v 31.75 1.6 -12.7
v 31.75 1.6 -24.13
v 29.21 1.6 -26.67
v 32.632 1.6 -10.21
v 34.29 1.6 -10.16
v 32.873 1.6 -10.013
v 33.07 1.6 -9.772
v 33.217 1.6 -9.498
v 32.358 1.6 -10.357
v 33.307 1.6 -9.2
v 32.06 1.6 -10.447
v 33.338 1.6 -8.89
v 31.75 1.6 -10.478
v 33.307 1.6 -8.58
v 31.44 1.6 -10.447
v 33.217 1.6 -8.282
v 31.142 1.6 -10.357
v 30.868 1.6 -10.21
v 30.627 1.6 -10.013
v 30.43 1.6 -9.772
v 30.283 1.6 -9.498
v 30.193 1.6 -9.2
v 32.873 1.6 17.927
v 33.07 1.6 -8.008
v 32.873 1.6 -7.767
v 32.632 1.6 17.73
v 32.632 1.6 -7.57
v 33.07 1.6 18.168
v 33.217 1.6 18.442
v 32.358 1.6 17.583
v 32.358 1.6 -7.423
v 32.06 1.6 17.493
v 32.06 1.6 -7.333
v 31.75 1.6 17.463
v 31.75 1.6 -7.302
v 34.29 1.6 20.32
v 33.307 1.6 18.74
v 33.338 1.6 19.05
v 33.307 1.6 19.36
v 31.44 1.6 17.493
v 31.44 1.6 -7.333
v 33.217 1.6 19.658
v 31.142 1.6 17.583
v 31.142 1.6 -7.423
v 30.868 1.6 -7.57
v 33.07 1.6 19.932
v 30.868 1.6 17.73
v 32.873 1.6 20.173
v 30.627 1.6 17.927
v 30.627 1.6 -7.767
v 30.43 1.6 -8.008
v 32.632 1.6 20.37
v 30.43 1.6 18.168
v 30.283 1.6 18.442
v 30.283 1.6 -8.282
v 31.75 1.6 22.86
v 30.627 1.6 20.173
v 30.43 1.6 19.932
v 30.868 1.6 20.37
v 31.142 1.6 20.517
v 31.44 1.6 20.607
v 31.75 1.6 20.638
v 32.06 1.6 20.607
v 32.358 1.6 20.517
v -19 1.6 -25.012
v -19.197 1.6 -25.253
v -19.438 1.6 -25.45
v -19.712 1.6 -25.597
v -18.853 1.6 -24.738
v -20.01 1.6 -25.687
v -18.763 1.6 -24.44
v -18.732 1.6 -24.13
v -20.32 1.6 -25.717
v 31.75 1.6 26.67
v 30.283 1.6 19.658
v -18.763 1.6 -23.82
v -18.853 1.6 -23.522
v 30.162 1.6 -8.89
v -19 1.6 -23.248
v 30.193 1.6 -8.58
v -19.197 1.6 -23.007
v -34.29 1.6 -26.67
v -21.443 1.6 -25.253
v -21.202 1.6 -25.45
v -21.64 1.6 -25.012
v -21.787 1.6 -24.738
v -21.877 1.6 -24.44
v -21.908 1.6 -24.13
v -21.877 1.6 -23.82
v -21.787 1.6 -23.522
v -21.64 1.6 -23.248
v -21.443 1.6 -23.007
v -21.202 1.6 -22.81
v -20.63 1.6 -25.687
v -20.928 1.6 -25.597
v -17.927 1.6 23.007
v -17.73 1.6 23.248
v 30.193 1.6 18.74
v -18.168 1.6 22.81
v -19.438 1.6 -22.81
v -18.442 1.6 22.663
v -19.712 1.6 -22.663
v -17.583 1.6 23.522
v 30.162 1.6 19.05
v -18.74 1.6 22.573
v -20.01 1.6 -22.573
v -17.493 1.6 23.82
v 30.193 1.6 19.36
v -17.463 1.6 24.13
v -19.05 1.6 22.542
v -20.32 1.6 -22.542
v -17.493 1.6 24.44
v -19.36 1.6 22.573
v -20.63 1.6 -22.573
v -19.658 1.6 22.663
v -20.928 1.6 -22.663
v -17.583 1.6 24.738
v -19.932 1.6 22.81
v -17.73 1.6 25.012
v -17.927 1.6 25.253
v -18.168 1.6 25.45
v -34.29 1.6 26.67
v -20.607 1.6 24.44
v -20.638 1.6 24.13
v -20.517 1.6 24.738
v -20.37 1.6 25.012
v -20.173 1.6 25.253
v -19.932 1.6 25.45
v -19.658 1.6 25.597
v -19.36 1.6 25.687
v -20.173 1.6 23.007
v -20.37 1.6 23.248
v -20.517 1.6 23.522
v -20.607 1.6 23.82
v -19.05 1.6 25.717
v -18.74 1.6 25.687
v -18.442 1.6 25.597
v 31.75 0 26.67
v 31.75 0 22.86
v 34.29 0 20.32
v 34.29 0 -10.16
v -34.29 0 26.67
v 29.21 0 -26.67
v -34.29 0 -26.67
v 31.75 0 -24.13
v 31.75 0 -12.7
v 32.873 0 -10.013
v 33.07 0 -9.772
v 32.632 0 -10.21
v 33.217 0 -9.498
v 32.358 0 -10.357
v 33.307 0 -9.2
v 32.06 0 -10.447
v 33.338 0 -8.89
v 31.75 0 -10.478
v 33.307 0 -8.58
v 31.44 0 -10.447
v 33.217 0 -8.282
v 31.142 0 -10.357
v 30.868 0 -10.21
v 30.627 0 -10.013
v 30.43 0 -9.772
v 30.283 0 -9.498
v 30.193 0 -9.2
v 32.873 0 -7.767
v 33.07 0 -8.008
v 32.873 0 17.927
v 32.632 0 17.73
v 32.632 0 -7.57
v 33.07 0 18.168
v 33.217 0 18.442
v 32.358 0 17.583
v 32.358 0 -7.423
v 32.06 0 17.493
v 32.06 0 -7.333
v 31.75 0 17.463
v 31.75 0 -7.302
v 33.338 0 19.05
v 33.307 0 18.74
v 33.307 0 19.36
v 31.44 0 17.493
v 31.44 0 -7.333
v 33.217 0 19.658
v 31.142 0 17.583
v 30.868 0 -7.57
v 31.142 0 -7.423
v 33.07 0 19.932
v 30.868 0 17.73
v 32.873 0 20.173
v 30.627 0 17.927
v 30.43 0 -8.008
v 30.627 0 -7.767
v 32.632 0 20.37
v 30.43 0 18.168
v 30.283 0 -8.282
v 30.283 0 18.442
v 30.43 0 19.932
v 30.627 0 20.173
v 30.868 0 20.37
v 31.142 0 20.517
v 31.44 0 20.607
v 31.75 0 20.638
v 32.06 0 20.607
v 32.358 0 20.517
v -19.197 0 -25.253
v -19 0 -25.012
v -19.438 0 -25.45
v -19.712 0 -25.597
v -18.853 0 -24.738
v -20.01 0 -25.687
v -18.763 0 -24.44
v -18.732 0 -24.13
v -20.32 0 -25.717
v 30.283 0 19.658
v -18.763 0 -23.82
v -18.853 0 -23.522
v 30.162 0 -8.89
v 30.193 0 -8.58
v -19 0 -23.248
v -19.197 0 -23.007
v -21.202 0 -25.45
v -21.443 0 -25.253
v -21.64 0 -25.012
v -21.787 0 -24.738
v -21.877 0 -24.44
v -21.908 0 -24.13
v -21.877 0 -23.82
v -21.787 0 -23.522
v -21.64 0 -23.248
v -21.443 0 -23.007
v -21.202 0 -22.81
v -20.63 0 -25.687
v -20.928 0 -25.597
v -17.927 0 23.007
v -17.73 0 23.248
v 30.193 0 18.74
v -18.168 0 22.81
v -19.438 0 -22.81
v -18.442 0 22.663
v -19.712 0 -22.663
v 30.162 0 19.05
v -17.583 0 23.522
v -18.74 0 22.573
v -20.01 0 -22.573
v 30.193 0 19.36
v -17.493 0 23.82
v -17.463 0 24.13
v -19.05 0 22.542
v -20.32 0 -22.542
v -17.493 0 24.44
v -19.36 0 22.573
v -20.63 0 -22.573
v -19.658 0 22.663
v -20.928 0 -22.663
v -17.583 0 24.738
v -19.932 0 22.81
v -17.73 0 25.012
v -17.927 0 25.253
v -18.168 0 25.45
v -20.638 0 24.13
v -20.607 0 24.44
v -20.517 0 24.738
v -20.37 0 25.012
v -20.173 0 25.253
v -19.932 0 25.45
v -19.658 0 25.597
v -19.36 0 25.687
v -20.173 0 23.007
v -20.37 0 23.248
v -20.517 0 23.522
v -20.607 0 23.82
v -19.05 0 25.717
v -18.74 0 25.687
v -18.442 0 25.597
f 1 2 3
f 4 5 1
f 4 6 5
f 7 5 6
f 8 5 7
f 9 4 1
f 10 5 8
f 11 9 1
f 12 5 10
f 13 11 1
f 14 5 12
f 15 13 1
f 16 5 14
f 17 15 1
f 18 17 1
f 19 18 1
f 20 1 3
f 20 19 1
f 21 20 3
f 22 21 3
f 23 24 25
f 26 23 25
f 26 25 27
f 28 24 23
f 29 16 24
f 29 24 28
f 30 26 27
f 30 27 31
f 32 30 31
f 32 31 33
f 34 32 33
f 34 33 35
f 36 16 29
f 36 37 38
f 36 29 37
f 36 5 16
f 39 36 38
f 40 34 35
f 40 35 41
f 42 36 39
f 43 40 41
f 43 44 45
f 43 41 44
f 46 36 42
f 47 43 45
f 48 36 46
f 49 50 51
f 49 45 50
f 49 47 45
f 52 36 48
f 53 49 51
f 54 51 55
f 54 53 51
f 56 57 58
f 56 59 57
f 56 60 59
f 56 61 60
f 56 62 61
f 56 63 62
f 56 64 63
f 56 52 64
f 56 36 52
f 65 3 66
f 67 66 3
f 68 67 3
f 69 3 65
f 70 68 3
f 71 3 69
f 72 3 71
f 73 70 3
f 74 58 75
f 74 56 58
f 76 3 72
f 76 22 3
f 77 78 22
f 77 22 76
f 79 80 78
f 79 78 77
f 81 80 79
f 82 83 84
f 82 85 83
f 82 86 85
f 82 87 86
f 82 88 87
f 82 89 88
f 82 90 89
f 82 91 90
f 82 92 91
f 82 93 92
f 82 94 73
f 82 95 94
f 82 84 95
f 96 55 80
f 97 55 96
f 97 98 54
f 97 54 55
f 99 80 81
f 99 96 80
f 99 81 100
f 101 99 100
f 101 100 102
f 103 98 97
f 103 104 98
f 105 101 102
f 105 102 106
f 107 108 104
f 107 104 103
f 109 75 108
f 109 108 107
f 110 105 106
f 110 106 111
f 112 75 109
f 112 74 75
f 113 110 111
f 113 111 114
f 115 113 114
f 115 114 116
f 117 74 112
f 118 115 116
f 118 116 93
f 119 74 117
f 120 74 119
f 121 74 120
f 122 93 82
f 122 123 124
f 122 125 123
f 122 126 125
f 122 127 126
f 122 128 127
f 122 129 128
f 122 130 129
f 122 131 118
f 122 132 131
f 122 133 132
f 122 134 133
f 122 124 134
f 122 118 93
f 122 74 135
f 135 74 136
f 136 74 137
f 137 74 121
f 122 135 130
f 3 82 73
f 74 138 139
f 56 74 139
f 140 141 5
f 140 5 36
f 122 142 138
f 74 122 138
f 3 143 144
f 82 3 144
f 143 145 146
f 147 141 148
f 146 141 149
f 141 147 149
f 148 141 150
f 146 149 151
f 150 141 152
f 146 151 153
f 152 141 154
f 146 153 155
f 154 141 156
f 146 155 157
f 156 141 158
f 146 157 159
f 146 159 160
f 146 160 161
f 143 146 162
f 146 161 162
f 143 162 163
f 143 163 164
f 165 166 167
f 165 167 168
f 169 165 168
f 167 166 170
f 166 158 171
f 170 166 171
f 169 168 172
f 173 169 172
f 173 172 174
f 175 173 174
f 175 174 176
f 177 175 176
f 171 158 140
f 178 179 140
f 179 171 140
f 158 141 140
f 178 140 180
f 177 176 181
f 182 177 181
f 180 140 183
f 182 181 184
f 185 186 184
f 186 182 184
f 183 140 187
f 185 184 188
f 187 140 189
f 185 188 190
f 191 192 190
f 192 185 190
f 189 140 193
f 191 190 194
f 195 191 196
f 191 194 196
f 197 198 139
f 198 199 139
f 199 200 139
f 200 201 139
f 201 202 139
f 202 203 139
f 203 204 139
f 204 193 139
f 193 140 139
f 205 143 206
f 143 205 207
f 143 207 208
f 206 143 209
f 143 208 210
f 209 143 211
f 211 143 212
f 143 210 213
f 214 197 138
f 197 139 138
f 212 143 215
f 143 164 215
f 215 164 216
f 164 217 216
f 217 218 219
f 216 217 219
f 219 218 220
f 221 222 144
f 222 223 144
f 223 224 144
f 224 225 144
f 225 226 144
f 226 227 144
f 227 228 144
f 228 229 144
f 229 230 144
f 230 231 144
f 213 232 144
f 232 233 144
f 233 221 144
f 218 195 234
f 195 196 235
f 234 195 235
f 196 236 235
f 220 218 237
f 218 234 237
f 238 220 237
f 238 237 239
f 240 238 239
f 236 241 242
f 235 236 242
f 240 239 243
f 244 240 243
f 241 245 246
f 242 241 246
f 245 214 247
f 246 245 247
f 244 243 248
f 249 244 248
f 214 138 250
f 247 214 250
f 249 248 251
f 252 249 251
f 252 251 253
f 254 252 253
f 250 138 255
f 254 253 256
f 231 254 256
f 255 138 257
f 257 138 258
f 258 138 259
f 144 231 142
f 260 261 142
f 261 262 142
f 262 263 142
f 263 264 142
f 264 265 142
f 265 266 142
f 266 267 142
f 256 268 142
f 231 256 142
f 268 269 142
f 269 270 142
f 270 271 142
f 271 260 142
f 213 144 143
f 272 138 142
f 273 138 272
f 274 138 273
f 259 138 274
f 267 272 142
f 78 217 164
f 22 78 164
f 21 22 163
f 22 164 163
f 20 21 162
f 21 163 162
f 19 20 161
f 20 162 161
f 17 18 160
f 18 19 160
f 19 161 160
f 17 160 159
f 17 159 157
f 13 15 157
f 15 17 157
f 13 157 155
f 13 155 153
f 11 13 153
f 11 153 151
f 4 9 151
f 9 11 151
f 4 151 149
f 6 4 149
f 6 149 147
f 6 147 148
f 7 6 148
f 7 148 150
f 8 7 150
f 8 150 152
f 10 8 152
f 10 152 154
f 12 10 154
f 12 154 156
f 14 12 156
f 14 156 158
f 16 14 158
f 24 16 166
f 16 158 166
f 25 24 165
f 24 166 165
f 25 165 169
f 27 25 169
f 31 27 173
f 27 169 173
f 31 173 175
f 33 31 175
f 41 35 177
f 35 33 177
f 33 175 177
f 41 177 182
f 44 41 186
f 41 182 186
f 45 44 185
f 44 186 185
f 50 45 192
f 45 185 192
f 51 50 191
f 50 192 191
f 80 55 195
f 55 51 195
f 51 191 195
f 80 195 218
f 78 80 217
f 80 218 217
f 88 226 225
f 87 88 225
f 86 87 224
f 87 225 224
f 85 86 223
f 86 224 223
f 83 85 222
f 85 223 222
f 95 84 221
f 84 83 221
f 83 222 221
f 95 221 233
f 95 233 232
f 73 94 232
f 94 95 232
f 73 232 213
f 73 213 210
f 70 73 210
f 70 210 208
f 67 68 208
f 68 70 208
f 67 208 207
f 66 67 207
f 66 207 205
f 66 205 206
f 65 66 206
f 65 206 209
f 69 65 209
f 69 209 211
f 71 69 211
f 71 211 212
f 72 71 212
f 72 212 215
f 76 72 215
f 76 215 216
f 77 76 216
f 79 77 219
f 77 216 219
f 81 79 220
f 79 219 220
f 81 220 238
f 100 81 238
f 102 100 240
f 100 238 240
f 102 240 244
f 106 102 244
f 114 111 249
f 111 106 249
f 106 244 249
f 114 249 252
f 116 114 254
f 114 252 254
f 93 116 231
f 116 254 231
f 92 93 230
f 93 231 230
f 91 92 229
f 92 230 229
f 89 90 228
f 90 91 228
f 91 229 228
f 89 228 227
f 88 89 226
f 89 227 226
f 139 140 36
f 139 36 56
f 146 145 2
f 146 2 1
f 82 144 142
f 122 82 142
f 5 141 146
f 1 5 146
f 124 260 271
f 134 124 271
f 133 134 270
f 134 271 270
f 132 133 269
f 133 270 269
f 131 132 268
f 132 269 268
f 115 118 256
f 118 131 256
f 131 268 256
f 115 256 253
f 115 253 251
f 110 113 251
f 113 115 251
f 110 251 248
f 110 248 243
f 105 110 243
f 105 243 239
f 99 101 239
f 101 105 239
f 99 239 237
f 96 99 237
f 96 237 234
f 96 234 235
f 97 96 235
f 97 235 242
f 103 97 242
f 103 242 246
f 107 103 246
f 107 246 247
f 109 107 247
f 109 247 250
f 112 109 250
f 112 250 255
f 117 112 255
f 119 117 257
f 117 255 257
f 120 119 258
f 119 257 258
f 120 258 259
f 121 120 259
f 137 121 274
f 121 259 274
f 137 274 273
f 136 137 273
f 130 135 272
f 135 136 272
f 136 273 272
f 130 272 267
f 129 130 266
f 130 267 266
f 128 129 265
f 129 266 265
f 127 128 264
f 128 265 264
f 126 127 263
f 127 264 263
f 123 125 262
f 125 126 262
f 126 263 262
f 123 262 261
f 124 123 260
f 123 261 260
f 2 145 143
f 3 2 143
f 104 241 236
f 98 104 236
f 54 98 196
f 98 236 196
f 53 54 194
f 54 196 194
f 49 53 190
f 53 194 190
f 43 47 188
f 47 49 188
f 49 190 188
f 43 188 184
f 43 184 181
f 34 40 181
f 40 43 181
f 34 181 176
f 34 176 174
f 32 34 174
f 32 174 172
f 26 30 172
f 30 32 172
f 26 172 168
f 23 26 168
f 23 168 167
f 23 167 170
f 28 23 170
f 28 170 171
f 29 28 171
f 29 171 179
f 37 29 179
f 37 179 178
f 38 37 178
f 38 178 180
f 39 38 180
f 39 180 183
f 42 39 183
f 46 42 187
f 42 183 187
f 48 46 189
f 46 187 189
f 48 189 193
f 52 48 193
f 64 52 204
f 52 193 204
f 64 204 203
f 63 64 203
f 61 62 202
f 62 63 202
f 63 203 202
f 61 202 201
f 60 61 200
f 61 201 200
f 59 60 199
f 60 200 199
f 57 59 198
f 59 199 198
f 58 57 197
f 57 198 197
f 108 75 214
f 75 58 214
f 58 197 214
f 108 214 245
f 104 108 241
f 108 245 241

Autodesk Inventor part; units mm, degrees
ref_plane "YZ Plane" through (0, 0, 0) normal (1, 0, 0) x (0, 1, 0)
ref_plane "XZ Plane" through (0, 0, 0) normal (0, 1, 0) x (-1, 0, 0)
ref_plane "XY Plane" through (0, 0, 0) normal (0, 0, 1) x (1, 0, 0)
sketch "Sketch1" plane through (0, 0, 0) normal (0, 1, 0) x (-1, 0, 0)
  line L0 (34.29, 26.67) -> (-34.29, 26.67) construction
  line L1 (-34.29, 26.67) -> (-34.29, -26.67) construction
  line L2 (-34.29, -26.67) -> (34.29, -26.67) construction
  line L3 (34.29, -26.67) -> (34.29, 26.67) construction
  line L4 (48.006, 0) -> (-48.006, 0) construction
  line L5 (0, -37.338) -> (0, 37.338) construction
  line L6 (-31.75, -24.13) -> (-31.75, -12.7)
  line L7 (-31.75, 26.67) -> (-31.75, 22.86)
  line L8 (-34.29, -10.16) -> (-34.29, 20.32)
  line L9 (-31.75, -12.7) -> (-31.75, -12.7)
  line L10 (-31.75, 22.86) -> (-31.75, 22.86)
  line L11 (-29.21, -26.67) -> (34.29, -26.67)
  line L12 (34.29, -26.67) -> (34.29, 26.67)
  line L13 (34.29, 26.67) -> (-31.75, 26.67)
  line L14 (-31.75, -24.13) -> (-29.21, -26.67)
  line L15 (-34.29, -10.16) -> (-31.75, -12.7)
  line L16 (-34.29, 20.32) -> (-31.75, 22.86)
  circle A0 centre (20.32, -24.13) radius 1.5875
  circle A1 centre (19.05, 24.13) radius 1.5875
  circle A2 centre (-31.75, 19.05) radius 1.5875
  circle A3 centre (-31.75, -8.89) radius 1.5875
  point P0 (0, 0)
  point P1 (0, -26.67)
  point P2 (-34.29, 0)
  point P3 (-31.75, -26.67)
  point P4 (-34.29, -12.7)
  point P5 (-34.29, 22.86)
  dimension "d0" = 68.58
  dimension "d1" = 53.34
  dimension "d2" = 2.54
  dimension "d3" = 3.81
  dimension "d4" = 13.97
  dimension "d5" = 2.54
  dimension "d6" = 2.54
  dimension "d7" = 2.54
  dimension "d8" = 2.54
  dimension "d9" = 2.54
  dimension "d10" = 2.54
  dimension "d11" = 3.175
  dimension "d12" = 13.97
  dimension "d13" = 15.24
  dimension "d14" = 66.04
  dimension "d15" = 66.04
  dimension "d16" = 27.94
  dimension "d17" = 15.24
  dimension "d18" = 7.62
  dimension "d19" = 2.54
extrude "Extrusion1" add sketch "Sketch1" along normal blind 1.6002
equation "\"d6\" = d5"
equation "\"d8\" = d7"
equation "\"d10\" = d9"
properties part number "Arduino-Uno-r3"
